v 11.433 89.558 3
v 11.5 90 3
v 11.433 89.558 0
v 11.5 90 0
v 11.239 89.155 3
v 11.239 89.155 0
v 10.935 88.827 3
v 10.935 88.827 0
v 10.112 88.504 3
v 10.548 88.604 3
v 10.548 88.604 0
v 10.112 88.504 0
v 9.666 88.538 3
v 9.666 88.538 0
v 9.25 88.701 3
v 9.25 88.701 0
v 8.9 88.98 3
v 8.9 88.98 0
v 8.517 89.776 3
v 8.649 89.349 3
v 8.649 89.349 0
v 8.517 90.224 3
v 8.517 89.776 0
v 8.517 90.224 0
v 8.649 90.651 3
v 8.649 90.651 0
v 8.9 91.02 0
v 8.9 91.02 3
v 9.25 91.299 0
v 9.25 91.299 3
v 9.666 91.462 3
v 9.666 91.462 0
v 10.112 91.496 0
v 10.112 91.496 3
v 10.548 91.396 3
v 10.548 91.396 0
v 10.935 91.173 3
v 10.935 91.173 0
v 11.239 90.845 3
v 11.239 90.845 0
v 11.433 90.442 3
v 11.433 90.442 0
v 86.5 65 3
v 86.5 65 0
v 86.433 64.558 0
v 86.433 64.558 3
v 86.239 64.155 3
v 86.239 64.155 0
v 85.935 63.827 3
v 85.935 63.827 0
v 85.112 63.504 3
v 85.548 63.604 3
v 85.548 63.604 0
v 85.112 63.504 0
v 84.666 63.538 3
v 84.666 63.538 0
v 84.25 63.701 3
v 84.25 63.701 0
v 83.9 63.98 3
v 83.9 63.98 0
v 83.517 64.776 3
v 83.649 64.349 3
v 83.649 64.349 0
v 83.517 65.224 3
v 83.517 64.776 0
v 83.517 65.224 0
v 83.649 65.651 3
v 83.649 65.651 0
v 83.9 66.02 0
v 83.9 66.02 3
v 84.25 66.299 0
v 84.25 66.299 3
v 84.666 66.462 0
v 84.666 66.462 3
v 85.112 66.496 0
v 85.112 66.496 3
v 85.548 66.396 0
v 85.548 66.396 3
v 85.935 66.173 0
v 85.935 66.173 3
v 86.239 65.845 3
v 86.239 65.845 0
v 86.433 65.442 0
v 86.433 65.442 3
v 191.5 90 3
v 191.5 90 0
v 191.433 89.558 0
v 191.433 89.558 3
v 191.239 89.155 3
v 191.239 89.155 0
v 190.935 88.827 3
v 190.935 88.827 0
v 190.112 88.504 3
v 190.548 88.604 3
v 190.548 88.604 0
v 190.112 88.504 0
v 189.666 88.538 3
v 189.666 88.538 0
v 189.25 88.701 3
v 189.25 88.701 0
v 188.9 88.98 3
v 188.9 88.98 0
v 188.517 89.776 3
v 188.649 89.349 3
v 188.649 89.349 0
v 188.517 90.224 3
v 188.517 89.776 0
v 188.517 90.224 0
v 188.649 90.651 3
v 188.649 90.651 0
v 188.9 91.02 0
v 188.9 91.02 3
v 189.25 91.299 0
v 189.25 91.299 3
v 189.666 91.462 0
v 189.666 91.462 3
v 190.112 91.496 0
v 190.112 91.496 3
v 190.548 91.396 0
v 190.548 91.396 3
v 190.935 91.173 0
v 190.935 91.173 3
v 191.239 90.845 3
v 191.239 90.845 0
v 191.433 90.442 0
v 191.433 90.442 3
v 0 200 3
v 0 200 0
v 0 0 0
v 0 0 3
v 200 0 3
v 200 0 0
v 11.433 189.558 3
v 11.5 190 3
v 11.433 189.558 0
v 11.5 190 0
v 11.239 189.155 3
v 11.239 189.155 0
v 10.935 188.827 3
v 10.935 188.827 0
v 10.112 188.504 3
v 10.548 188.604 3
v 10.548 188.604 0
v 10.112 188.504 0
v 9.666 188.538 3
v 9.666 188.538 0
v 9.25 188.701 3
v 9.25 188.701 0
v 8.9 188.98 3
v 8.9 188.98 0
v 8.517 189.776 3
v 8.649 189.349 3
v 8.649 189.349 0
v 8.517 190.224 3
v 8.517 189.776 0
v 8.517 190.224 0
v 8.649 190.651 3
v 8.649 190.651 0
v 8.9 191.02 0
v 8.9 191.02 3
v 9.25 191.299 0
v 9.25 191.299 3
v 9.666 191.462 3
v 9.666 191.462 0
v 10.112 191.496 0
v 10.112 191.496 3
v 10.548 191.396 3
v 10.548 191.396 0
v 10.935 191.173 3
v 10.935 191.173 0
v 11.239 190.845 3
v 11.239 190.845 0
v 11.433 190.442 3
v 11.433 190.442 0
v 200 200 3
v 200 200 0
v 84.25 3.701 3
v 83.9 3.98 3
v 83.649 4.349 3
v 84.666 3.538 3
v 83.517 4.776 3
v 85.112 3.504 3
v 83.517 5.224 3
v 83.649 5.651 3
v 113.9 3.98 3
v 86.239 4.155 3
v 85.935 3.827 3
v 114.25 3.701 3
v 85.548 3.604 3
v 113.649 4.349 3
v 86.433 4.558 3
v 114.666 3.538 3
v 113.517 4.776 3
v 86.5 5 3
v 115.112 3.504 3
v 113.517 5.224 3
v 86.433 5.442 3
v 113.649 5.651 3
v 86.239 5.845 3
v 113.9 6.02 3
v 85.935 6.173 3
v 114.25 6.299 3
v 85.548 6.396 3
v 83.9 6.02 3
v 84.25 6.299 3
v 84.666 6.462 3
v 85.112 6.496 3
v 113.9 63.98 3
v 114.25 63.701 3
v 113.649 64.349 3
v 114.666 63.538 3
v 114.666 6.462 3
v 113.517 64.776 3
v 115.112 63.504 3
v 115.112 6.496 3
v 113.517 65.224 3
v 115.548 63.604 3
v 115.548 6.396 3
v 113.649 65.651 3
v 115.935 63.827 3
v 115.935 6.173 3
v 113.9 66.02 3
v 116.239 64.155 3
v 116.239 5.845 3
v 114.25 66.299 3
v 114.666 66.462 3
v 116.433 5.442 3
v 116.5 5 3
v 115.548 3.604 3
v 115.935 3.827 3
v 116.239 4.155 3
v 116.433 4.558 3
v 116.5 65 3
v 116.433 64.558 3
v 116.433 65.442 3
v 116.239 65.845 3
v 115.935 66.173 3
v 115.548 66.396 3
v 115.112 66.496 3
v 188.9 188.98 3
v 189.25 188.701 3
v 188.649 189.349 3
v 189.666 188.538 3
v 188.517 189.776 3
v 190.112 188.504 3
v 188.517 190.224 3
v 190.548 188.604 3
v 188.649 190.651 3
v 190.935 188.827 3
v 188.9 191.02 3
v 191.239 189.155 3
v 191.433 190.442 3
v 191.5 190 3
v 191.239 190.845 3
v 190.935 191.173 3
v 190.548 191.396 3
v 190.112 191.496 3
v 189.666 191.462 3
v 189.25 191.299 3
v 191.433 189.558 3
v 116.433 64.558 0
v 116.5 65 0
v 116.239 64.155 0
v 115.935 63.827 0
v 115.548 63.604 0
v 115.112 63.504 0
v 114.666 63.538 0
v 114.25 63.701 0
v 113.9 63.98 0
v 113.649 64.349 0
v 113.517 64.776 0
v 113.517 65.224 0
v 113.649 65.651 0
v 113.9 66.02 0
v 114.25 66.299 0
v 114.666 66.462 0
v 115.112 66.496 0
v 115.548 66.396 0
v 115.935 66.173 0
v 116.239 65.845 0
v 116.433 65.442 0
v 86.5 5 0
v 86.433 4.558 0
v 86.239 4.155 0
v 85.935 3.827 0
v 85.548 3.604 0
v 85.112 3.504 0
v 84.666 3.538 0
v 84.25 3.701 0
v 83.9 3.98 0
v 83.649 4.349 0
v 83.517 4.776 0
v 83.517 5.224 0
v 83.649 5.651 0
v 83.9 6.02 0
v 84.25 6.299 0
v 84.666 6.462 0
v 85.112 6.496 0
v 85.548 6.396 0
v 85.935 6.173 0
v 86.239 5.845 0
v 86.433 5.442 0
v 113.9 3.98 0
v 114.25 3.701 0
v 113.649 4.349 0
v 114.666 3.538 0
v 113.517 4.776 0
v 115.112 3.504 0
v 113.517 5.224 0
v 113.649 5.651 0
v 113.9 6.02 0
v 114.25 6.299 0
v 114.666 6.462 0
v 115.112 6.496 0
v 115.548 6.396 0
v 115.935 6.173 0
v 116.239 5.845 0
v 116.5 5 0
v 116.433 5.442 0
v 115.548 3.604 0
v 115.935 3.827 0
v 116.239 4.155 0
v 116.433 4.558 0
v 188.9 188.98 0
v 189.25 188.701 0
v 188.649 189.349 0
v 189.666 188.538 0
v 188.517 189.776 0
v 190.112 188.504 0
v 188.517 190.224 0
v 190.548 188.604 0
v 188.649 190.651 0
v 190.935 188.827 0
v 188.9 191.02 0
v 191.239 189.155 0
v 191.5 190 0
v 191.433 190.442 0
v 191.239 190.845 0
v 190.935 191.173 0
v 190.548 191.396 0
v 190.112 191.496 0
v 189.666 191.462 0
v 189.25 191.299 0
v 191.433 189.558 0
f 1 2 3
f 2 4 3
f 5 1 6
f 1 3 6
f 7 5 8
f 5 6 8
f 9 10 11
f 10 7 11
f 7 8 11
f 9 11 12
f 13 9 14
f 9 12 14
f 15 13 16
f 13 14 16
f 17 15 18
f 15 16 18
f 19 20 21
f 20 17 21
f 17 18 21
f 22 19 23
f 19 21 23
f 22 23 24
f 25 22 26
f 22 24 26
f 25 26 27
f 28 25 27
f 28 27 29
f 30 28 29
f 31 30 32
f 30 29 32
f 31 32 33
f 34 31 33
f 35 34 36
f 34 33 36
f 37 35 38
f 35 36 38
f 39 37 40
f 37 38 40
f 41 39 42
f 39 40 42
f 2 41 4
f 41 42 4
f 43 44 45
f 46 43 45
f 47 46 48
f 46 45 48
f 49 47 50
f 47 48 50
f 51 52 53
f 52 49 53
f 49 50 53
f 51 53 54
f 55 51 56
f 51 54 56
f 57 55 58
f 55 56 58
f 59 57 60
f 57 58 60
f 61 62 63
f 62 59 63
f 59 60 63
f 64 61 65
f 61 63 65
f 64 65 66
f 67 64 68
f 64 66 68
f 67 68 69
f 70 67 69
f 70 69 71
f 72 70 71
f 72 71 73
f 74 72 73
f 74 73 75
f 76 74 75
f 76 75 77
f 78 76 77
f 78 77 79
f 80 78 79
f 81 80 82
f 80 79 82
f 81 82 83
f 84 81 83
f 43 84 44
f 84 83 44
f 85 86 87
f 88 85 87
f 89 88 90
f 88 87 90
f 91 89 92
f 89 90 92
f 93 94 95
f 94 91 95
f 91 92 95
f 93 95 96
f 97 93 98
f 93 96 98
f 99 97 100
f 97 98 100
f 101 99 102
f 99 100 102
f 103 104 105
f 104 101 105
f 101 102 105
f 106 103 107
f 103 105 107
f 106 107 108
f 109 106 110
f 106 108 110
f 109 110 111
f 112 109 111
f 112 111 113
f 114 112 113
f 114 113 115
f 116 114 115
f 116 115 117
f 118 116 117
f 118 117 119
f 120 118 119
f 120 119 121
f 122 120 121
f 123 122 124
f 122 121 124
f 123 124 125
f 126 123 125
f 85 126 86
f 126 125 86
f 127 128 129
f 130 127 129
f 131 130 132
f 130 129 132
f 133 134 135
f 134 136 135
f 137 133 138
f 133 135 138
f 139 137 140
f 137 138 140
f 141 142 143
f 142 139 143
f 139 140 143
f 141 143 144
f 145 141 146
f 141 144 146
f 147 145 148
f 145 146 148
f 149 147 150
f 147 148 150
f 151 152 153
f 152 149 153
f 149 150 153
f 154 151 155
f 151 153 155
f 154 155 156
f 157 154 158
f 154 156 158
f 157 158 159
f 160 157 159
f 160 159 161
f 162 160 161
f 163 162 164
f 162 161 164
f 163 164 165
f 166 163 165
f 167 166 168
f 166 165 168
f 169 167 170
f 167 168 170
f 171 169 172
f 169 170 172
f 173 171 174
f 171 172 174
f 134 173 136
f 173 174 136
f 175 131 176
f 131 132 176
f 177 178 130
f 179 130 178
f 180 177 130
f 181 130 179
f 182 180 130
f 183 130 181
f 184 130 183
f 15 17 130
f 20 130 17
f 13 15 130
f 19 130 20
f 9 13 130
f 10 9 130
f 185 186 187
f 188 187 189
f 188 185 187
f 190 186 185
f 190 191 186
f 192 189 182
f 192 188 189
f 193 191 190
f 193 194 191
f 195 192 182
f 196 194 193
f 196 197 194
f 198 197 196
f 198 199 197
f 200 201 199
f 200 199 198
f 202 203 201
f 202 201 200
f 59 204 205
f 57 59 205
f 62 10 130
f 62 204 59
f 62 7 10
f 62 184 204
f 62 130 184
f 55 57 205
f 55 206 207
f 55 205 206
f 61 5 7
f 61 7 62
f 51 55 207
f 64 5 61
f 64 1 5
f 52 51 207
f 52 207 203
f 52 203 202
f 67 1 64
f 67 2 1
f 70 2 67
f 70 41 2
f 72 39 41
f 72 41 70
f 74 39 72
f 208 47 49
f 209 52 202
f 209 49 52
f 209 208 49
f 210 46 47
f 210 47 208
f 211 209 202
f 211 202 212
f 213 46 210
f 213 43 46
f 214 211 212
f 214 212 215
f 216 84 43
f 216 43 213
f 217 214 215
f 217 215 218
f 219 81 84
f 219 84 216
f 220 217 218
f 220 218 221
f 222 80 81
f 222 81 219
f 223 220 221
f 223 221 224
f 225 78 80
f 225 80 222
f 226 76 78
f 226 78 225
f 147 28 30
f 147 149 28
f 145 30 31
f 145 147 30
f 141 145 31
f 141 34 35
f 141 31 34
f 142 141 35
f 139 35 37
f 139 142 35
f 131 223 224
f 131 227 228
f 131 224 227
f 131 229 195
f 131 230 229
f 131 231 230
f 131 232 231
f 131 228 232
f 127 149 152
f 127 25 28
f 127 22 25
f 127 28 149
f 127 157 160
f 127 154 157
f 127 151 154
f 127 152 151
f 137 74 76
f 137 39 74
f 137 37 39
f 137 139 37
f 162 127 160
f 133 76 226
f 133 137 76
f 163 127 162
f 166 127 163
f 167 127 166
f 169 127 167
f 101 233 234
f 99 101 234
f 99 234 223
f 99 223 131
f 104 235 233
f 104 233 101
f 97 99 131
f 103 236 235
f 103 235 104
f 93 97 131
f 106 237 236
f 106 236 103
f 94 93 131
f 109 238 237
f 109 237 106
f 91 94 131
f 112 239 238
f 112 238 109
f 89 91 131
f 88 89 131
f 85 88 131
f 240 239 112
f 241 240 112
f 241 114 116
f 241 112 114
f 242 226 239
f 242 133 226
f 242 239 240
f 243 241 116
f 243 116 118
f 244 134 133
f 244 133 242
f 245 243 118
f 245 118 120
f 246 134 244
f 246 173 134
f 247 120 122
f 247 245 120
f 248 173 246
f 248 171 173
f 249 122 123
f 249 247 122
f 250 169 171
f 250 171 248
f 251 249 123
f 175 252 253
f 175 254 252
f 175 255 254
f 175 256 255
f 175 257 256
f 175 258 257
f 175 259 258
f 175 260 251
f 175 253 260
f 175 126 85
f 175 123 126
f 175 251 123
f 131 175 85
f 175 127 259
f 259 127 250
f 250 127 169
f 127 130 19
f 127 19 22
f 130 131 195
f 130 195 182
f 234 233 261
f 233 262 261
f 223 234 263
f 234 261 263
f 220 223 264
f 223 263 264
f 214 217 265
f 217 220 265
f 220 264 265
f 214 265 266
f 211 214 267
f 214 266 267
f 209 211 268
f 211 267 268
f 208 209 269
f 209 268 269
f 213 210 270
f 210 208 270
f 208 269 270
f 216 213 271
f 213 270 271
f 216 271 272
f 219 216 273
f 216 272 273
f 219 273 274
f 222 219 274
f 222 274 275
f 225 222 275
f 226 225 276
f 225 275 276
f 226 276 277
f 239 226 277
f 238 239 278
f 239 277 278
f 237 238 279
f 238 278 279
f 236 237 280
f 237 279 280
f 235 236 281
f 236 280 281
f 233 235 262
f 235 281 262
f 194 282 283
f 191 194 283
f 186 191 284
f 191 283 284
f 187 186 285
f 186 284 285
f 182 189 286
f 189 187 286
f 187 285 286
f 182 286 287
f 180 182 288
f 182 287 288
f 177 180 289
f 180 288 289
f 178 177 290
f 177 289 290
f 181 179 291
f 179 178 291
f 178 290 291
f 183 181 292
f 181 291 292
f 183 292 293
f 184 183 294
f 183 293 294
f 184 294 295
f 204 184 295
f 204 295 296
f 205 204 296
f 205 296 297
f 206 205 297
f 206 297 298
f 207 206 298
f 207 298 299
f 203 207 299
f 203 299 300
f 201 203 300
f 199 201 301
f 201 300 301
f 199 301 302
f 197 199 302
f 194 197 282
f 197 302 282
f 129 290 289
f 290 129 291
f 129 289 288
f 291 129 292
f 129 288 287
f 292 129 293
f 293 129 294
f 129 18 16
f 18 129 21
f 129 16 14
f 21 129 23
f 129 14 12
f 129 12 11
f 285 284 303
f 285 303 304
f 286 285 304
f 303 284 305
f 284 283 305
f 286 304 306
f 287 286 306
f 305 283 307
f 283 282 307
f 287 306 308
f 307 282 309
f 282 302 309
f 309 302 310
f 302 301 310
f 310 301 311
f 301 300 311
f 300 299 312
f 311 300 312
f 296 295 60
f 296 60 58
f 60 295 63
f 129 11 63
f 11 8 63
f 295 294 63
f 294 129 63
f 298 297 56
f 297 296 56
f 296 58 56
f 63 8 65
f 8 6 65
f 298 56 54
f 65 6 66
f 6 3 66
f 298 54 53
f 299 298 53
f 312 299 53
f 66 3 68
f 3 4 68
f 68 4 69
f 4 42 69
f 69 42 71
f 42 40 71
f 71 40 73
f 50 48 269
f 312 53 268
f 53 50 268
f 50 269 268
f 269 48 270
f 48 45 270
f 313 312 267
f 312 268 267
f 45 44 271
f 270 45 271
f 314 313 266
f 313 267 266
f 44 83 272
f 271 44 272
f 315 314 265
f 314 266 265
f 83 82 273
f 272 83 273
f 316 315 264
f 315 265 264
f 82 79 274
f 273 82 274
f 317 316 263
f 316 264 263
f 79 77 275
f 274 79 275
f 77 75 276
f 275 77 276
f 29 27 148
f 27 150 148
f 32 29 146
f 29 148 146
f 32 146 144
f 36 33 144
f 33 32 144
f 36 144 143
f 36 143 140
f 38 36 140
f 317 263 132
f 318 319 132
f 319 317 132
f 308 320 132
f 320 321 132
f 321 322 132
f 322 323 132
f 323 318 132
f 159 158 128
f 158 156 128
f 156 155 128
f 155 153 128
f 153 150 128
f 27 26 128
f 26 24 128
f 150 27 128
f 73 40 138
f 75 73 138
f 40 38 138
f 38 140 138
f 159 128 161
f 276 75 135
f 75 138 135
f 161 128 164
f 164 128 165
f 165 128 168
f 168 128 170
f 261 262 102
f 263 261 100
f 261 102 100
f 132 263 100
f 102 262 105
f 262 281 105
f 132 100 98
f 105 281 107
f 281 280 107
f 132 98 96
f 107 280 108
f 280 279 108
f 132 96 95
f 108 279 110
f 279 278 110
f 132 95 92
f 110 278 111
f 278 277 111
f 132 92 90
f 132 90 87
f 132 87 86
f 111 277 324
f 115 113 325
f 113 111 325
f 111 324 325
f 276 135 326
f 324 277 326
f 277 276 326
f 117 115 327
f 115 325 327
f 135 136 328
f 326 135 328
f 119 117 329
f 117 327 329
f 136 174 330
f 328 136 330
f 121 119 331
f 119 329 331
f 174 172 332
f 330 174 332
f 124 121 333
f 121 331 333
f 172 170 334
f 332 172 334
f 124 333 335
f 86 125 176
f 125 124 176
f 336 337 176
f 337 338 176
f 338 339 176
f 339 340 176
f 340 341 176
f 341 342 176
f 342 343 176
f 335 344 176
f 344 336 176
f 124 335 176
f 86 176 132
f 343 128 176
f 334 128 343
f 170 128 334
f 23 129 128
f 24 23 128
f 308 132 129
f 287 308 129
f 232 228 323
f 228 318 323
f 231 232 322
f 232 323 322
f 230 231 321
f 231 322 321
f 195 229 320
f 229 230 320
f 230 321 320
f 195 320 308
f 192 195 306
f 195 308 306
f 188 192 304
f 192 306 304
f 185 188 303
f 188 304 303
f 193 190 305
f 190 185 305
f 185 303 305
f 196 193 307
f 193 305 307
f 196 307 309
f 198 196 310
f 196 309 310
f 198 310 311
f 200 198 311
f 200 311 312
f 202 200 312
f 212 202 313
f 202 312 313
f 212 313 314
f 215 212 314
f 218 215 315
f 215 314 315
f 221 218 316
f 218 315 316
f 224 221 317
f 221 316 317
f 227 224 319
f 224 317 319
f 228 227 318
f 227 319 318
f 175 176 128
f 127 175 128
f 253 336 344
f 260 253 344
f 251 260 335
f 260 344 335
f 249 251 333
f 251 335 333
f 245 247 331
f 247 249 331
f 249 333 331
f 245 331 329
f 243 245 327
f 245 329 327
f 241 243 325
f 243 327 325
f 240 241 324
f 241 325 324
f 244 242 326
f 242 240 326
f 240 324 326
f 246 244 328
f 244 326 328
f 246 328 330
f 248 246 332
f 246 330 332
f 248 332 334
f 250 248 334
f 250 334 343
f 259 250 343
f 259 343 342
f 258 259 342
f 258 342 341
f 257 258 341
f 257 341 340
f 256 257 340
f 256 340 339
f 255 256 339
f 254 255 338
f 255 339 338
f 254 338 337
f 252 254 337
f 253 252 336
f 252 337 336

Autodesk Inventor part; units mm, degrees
ref_plane "YZ Plane" through (0, 0, 0) normal (1, 0, 0) x (0, 1, 0)
ref_plane "XZ Plane" through (0, 0, 0) normal (0, 1, 0) x (-1, 0, 0)
ref_plane "XY Plane" through (0, 0, 0) normal (0, 0, 1) x (1, 0, 0)
sketch "Sketch1" plane through (0, 0, 0) normal (0, 0, 1) x (1, 0, 0)
  line L0 (0, 0) -> (200, 0)
  line L1 (200, 0) -> (200, 200)
  line L2 (200, 200) -> (0, 200)
  line L3 (0, 200) -> (0, 0)
  circle A0 centre (85, 5) radius 1.5
  circle A1 centre (115, 5) radius 1.5
  circle A2 centre (85, 65) radius 1.5
  circle A3 centre (115, 65) radius 1.5
  circle A4 centre (10, 190) radius 1.5
  circle A5 centre (190, 190) radius 1.5
  circle A6 centre (10, 90) radius 1.5
  circle A7 centre (190, 90) radius 1.5
  dimension "d0" = 200
  dimension "d1" = 200
  dimension "d2" = 3
  dimension "d3" = 3
  dimension "d4" = 5
  dimension "d5" = 5
  dimension "d6" = 30
  dimension "d7" = 85
  dimension "d8" = 3
  dimension "d9" = 3
  dimension "d10" = 85
  dimension "d11" = 60
  dimension "d12" = 30
  dimension "d13" = 60
  dimension "d14" = 3
  dimension "d15" = 3
  dimension "d16" = 10
  dimension "d17" = 10
  dimension "d18" = 10
  dimension "d19" = 10
  dimension "d20" = 3
  dimension "d21" = 3
  dimension "d22" = 10
  dimension "d23" = 10
  dimension "d24" = 100
  dimension "d25" = 100
extrude "Extrusion1" add sketch "Sketch1" along normal blind 3
properties part number "brackert-temporary-2" material "PC/ABS Plastic"
